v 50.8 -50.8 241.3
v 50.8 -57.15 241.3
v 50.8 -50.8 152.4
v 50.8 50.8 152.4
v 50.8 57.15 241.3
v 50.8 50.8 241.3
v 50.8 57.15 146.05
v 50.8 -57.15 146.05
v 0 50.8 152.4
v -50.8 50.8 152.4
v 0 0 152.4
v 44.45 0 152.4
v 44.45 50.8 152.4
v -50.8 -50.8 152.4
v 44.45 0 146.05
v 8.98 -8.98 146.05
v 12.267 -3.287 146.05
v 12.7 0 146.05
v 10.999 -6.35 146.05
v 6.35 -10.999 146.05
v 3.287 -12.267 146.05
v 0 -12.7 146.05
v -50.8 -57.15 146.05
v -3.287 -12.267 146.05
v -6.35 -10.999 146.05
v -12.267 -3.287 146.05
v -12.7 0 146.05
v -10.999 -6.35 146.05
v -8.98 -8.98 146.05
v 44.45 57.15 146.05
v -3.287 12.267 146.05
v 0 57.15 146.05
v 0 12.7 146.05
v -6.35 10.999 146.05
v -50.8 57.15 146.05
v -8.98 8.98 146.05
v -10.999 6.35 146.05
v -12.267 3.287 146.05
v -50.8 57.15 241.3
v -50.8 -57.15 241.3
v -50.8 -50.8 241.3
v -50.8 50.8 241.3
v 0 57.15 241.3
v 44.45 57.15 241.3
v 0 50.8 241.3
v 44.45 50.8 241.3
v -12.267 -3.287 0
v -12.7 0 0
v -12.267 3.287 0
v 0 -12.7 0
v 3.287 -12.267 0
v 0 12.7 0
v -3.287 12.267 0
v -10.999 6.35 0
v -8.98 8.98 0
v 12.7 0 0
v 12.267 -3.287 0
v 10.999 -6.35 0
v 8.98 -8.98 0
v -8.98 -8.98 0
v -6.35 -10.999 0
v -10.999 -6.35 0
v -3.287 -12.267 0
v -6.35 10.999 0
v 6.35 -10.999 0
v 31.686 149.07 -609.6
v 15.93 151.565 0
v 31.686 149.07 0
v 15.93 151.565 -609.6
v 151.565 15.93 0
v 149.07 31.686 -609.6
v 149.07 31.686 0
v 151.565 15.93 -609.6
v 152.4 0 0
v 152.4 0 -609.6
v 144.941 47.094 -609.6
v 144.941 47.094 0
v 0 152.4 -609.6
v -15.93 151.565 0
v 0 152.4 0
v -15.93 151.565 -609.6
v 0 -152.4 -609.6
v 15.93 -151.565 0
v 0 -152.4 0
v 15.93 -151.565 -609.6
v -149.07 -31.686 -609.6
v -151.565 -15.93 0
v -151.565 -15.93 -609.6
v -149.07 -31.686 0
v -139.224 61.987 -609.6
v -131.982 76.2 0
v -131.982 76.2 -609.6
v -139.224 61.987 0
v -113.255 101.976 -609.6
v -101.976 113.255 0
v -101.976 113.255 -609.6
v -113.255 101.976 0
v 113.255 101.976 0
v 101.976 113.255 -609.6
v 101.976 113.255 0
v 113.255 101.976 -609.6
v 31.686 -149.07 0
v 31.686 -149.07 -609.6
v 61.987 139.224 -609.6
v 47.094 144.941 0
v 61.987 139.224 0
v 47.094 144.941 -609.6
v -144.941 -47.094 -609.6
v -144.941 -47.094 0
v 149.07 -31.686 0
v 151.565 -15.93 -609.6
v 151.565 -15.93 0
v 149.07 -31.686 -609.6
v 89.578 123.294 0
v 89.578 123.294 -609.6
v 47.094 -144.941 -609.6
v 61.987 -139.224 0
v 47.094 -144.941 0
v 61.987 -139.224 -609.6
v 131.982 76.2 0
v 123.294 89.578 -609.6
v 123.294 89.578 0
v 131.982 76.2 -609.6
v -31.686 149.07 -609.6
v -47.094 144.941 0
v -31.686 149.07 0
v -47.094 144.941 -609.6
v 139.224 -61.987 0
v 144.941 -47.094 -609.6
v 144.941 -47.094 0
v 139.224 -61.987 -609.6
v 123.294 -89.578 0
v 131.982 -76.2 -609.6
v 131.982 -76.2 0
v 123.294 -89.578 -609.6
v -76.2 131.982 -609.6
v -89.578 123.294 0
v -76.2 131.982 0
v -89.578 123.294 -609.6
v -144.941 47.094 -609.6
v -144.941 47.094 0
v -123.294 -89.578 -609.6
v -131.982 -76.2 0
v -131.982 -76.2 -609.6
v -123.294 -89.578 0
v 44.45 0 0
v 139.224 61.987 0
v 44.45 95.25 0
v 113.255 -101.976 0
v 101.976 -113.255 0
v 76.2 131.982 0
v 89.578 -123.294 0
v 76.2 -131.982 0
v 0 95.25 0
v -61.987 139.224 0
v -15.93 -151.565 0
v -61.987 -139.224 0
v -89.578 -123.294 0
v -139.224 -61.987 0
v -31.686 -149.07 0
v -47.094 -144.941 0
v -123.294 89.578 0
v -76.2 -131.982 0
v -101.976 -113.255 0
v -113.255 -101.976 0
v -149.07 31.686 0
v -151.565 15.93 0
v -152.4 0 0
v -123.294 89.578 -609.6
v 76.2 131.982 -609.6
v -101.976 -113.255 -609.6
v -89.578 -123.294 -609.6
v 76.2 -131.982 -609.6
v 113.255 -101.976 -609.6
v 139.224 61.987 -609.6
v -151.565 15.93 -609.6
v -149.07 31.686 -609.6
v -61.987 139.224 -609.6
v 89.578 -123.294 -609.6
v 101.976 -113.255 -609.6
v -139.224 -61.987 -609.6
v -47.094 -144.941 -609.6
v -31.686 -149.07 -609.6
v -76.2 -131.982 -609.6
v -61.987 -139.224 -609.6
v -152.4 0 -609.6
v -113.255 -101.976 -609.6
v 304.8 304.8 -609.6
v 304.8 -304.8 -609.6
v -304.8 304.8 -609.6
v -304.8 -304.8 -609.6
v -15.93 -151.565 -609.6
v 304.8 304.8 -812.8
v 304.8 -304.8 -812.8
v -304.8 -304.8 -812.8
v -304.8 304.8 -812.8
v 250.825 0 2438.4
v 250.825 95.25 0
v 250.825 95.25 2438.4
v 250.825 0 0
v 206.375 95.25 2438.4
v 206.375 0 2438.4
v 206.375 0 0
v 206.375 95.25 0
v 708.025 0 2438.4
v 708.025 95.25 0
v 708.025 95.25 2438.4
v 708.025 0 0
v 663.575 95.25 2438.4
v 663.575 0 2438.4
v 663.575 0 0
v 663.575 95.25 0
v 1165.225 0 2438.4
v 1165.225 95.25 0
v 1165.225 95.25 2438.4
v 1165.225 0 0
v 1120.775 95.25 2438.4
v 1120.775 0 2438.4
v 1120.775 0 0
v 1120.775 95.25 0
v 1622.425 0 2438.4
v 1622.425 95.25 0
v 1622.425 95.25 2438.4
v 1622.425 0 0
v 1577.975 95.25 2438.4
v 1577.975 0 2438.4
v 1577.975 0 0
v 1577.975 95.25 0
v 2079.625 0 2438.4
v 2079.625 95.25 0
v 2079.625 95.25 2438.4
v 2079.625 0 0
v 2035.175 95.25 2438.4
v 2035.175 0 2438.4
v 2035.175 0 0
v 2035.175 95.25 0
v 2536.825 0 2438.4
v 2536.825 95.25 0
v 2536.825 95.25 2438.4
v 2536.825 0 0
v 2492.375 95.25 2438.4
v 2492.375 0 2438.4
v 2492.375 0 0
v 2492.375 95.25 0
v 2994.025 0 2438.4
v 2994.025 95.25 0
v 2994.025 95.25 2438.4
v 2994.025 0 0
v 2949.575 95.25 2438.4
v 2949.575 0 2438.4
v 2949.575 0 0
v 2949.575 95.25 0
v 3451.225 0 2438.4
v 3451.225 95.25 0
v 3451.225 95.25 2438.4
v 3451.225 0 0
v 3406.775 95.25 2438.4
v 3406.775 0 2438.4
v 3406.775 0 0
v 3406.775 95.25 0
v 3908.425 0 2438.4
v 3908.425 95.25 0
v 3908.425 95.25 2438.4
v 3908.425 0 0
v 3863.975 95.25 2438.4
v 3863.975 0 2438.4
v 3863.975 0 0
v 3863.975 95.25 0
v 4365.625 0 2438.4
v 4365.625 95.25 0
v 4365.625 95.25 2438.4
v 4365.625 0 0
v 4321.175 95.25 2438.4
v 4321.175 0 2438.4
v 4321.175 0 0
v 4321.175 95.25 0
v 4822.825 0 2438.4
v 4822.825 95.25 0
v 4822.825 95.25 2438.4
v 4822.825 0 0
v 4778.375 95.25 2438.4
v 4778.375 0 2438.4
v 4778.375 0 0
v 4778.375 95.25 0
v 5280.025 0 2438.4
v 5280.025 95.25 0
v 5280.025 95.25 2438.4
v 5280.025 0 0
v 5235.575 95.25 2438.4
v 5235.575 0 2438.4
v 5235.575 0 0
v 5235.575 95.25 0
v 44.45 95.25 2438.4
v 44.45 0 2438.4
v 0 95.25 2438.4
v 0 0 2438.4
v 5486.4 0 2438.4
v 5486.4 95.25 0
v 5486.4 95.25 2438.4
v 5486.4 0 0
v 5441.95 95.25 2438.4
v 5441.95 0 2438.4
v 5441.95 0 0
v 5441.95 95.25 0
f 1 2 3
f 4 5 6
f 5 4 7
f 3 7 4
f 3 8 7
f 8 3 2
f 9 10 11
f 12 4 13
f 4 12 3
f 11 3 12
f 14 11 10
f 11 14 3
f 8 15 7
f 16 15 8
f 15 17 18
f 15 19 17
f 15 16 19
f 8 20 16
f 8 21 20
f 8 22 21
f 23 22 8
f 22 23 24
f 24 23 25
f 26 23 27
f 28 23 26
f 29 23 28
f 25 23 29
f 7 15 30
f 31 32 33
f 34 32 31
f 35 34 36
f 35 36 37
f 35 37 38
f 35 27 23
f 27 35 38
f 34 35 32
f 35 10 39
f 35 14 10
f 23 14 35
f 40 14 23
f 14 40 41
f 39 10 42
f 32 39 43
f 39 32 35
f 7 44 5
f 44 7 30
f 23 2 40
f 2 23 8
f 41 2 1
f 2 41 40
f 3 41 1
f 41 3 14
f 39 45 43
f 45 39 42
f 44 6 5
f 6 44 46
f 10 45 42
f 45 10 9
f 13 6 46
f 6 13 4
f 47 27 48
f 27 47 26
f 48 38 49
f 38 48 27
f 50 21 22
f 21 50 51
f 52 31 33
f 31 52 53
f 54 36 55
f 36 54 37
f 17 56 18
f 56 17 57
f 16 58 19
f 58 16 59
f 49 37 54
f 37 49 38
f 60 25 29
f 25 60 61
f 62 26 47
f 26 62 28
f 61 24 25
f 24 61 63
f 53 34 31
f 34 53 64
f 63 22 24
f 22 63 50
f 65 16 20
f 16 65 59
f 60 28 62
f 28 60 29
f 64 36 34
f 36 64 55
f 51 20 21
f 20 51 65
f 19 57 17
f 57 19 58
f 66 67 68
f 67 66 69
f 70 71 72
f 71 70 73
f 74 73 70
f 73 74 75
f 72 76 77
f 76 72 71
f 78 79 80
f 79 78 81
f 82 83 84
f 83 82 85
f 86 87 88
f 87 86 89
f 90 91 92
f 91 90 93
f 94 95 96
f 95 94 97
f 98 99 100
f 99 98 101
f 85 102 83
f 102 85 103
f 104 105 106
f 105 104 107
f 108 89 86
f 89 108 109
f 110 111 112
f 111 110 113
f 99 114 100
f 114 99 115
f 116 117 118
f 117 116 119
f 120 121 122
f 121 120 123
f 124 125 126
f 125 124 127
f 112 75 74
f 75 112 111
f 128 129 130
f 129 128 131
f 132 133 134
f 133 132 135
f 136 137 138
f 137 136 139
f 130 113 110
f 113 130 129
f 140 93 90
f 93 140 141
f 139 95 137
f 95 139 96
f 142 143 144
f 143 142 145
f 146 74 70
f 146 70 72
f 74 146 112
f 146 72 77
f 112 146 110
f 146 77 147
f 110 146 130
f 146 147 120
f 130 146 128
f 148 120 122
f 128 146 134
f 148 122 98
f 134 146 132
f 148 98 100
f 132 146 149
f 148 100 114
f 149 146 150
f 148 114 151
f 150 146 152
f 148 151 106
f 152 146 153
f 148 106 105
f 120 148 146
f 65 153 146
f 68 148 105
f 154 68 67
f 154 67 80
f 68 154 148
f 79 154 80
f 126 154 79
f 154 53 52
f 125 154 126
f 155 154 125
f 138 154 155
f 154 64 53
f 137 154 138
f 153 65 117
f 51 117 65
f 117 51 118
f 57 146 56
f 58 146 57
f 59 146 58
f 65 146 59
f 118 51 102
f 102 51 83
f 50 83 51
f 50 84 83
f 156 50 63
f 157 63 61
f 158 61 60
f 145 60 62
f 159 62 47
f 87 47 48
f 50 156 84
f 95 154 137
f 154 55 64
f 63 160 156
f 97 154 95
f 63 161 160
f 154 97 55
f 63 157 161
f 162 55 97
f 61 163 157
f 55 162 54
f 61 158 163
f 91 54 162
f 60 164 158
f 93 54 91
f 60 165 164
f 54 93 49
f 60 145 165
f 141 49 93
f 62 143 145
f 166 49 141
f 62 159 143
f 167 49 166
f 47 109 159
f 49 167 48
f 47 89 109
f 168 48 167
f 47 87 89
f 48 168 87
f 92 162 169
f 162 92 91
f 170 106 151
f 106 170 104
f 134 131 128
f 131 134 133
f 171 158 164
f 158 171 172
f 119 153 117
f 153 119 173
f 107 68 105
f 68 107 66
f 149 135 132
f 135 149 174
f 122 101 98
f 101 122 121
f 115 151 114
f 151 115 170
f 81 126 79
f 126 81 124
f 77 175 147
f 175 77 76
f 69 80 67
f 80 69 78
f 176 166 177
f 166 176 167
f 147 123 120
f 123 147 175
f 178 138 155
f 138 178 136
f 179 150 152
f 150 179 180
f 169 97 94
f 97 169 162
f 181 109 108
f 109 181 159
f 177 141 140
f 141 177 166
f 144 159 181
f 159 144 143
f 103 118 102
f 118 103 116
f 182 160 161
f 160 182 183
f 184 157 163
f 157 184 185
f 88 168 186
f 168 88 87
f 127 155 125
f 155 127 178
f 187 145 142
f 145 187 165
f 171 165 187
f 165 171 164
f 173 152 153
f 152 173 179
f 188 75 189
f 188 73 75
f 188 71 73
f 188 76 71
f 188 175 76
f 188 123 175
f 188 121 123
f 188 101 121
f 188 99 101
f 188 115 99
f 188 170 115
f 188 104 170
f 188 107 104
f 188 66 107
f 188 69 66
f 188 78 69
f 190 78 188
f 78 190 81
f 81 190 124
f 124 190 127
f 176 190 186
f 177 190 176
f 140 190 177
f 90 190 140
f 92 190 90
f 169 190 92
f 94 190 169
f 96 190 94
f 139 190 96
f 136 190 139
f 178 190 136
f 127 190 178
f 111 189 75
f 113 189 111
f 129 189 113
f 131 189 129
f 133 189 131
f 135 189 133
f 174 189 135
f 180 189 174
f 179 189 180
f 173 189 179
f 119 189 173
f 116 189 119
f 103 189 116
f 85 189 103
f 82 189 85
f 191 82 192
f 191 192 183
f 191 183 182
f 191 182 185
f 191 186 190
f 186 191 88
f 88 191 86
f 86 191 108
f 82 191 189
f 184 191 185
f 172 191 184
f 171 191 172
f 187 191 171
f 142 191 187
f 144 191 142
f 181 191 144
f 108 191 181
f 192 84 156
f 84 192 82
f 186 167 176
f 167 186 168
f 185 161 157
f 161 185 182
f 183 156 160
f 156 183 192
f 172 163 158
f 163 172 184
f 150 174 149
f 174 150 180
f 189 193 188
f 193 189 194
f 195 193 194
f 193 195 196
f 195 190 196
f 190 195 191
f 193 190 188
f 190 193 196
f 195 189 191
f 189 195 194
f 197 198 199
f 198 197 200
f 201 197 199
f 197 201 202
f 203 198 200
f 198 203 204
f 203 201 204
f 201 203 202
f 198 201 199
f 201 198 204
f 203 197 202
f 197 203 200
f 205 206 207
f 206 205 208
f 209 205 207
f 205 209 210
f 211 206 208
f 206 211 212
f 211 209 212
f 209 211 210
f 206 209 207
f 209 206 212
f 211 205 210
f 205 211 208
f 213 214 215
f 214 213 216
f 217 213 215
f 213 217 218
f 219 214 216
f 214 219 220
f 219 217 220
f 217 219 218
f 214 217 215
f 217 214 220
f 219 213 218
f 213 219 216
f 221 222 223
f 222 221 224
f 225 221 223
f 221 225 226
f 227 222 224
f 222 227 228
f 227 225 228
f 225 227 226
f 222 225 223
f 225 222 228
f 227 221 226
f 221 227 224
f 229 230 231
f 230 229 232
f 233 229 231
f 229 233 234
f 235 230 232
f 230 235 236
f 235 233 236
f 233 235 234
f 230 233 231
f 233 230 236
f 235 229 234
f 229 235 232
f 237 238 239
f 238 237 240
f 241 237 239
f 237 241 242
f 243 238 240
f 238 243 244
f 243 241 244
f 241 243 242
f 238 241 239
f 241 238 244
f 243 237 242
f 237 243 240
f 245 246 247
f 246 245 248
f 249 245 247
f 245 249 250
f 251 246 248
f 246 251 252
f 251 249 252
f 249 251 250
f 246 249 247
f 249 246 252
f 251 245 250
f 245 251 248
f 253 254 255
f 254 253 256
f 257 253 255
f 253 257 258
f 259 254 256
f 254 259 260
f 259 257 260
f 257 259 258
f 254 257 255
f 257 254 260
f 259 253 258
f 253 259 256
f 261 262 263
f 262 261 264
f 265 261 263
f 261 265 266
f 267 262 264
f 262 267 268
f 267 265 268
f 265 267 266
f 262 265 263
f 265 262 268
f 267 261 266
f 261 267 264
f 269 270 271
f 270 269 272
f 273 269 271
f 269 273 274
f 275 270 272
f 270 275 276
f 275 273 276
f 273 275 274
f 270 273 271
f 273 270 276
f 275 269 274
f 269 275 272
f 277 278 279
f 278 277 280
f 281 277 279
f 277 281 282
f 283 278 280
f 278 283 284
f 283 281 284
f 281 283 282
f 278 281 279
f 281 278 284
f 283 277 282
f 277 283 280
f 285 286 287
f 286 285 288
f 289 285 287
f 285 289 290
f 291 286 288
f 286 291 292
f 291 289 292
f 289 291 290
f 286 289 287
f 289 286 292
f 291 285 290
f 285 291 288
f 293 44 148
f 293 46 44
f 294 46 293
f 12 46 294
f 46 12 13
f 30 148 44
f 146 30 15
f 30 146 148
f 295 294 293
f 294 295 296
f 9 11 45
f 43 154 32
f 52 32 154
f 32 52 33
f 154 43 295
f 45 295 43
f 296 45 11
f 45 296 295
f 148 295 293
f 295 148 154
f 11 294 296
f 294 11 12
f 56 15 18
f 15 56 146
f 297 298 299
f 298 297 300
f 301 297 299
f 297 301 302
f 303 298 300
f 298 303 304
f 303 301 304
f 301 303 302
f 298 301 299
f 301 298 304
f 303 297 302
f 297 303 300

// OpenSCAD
inch=25.4;
gap=0; // visual aid
stud_spacing_inches=18;


two_by_four_width_inches=3.75;
two_by_four_height_inches=1.75;
pier_width_inches=12;

pier_max_distances=12*8*inch;
pier_min_distance=pier_width_inches*inch*2.5;
pier_fineness=60;

bracket_width_inches=1;
bracket_fineness=24;
bracket_stock_inches=0.25;

block_length_inches=16;
block_width_inches=8;
block_height_inches=8;

slab_length_inches=24;
slab_width_inches=24;
slab_height_inches=8;


stud_spacing=stud_spacing_inches*inch;

two_by_four_width=two_by_four_width_inches*inch;
two_by_four_height=two_by_four_height_inches*inch;

pier_width=pier_width_inches*inch;
bracket_width=bracket_width_inches*inch;
bracket_stock=bracket_stock_inches*inch;

block_length=block_length_inches*inch;
block_width=block_width_inches*inch;
block_height=block_height_inches*inch;

slab_length=slab_length_inches*inch;
slab_width=slab_width_inches*inch;
slab_height=slab_height_inches*inch;

module pier(depth){
    color([0.8,0.8,0.8,0.8])
    translate([0,0,-depth])
    cylinder(depth,pier_width/2,pier_width/2,$fn=pier_fineness);
}

module pier_placement(length,sans_start,sans_finish){
    count=length-2*(1.5*pier_width);
    
}

module bracket(length,height,box_size,box_height){
    color([0.2,0.2,0.2,1]){
        translate([0,0,-length+height])
        cylinder(length-bracket_stock+0.001,bracket_width/2,bracket_width/2,$fn=bracket_fineness);
        translate([-box_size/2,-bracket_stock-box_size/2,height-bracket_stock]){
            cube([box_size,box_size+bracket_stock*2,bracket_stock]);
            translate([0,0,bracket_stock-0.001])
            cube([box_size,bracket_stock,box_height+0.001]);
            translate([0,bracket_stock+box_size,bracket_stock-0.001])
            cube([box_size,bracket_stock,box_height+0.001]);
        }
    }
}

module block(){
    color([0.8,0.8,0.8,1])
    cube([block_length,block_width,block_height]);
}

module cap(){
    color([0.8,0.8,0.8,1])
    cube([16*inch,16*inch,16*inch]);
}

module slab(){
    color([0.8,0.8,0.8,1])
    translate([-slab_length/2,-slab_width/2,-slab_height])
    cube([slab_length,slab_width,slab_height]);
}

module pier_one(length,height){
    bracket(18*inch,height,4*inch,3.5*inch);
    pier(length);
    translate([0,0,-length])
    slab();
}

module pier_two(length,height){
    for (i=[0:floor(length/(block_height+gap))-1]){
        rotate([0,0,(i%2)?90:0])
        translate([0,0,-length+(block_height+gap)*i+height])
        translate([-block_length/2,-block_width-gap/2,0]){
            block();
            translate([0,8*inch+gap,0])
            block();
        }
    }
    translate([0,0,-length+height])
    slab();
}




module two_by_four(length){
    cube(size=[two_by_four_height,two_by_four_width,length]);
}

module two_by_four_center(length){
    translate([-two_by_four_depth/2,-two_by_four_width/2,0])
    two_by_four(length);
}


module wall_section(length,height,sans_begin,sans_end){
    count=floor((length-two_by_four_height*2)/stud_spacing);
    two_by_four(height);
    diff=((length-two_by_four_height)-(stud_spacing*count))/2;
    echo(diff);
    echo(count);
    translate([diff,0,0])
    for (i=[0:count]){
        translate([stud_spacing*i,0,0])
        two_by_four(height);
    }
    
    translate([-two_by_four_height+length,0,0])
    two_by_four(height);
    
}

pier_one(24*inch,6*inch);
//pier_two(80*inch,6*inch);

wall_section(18*12*inch,8*12*inch);
